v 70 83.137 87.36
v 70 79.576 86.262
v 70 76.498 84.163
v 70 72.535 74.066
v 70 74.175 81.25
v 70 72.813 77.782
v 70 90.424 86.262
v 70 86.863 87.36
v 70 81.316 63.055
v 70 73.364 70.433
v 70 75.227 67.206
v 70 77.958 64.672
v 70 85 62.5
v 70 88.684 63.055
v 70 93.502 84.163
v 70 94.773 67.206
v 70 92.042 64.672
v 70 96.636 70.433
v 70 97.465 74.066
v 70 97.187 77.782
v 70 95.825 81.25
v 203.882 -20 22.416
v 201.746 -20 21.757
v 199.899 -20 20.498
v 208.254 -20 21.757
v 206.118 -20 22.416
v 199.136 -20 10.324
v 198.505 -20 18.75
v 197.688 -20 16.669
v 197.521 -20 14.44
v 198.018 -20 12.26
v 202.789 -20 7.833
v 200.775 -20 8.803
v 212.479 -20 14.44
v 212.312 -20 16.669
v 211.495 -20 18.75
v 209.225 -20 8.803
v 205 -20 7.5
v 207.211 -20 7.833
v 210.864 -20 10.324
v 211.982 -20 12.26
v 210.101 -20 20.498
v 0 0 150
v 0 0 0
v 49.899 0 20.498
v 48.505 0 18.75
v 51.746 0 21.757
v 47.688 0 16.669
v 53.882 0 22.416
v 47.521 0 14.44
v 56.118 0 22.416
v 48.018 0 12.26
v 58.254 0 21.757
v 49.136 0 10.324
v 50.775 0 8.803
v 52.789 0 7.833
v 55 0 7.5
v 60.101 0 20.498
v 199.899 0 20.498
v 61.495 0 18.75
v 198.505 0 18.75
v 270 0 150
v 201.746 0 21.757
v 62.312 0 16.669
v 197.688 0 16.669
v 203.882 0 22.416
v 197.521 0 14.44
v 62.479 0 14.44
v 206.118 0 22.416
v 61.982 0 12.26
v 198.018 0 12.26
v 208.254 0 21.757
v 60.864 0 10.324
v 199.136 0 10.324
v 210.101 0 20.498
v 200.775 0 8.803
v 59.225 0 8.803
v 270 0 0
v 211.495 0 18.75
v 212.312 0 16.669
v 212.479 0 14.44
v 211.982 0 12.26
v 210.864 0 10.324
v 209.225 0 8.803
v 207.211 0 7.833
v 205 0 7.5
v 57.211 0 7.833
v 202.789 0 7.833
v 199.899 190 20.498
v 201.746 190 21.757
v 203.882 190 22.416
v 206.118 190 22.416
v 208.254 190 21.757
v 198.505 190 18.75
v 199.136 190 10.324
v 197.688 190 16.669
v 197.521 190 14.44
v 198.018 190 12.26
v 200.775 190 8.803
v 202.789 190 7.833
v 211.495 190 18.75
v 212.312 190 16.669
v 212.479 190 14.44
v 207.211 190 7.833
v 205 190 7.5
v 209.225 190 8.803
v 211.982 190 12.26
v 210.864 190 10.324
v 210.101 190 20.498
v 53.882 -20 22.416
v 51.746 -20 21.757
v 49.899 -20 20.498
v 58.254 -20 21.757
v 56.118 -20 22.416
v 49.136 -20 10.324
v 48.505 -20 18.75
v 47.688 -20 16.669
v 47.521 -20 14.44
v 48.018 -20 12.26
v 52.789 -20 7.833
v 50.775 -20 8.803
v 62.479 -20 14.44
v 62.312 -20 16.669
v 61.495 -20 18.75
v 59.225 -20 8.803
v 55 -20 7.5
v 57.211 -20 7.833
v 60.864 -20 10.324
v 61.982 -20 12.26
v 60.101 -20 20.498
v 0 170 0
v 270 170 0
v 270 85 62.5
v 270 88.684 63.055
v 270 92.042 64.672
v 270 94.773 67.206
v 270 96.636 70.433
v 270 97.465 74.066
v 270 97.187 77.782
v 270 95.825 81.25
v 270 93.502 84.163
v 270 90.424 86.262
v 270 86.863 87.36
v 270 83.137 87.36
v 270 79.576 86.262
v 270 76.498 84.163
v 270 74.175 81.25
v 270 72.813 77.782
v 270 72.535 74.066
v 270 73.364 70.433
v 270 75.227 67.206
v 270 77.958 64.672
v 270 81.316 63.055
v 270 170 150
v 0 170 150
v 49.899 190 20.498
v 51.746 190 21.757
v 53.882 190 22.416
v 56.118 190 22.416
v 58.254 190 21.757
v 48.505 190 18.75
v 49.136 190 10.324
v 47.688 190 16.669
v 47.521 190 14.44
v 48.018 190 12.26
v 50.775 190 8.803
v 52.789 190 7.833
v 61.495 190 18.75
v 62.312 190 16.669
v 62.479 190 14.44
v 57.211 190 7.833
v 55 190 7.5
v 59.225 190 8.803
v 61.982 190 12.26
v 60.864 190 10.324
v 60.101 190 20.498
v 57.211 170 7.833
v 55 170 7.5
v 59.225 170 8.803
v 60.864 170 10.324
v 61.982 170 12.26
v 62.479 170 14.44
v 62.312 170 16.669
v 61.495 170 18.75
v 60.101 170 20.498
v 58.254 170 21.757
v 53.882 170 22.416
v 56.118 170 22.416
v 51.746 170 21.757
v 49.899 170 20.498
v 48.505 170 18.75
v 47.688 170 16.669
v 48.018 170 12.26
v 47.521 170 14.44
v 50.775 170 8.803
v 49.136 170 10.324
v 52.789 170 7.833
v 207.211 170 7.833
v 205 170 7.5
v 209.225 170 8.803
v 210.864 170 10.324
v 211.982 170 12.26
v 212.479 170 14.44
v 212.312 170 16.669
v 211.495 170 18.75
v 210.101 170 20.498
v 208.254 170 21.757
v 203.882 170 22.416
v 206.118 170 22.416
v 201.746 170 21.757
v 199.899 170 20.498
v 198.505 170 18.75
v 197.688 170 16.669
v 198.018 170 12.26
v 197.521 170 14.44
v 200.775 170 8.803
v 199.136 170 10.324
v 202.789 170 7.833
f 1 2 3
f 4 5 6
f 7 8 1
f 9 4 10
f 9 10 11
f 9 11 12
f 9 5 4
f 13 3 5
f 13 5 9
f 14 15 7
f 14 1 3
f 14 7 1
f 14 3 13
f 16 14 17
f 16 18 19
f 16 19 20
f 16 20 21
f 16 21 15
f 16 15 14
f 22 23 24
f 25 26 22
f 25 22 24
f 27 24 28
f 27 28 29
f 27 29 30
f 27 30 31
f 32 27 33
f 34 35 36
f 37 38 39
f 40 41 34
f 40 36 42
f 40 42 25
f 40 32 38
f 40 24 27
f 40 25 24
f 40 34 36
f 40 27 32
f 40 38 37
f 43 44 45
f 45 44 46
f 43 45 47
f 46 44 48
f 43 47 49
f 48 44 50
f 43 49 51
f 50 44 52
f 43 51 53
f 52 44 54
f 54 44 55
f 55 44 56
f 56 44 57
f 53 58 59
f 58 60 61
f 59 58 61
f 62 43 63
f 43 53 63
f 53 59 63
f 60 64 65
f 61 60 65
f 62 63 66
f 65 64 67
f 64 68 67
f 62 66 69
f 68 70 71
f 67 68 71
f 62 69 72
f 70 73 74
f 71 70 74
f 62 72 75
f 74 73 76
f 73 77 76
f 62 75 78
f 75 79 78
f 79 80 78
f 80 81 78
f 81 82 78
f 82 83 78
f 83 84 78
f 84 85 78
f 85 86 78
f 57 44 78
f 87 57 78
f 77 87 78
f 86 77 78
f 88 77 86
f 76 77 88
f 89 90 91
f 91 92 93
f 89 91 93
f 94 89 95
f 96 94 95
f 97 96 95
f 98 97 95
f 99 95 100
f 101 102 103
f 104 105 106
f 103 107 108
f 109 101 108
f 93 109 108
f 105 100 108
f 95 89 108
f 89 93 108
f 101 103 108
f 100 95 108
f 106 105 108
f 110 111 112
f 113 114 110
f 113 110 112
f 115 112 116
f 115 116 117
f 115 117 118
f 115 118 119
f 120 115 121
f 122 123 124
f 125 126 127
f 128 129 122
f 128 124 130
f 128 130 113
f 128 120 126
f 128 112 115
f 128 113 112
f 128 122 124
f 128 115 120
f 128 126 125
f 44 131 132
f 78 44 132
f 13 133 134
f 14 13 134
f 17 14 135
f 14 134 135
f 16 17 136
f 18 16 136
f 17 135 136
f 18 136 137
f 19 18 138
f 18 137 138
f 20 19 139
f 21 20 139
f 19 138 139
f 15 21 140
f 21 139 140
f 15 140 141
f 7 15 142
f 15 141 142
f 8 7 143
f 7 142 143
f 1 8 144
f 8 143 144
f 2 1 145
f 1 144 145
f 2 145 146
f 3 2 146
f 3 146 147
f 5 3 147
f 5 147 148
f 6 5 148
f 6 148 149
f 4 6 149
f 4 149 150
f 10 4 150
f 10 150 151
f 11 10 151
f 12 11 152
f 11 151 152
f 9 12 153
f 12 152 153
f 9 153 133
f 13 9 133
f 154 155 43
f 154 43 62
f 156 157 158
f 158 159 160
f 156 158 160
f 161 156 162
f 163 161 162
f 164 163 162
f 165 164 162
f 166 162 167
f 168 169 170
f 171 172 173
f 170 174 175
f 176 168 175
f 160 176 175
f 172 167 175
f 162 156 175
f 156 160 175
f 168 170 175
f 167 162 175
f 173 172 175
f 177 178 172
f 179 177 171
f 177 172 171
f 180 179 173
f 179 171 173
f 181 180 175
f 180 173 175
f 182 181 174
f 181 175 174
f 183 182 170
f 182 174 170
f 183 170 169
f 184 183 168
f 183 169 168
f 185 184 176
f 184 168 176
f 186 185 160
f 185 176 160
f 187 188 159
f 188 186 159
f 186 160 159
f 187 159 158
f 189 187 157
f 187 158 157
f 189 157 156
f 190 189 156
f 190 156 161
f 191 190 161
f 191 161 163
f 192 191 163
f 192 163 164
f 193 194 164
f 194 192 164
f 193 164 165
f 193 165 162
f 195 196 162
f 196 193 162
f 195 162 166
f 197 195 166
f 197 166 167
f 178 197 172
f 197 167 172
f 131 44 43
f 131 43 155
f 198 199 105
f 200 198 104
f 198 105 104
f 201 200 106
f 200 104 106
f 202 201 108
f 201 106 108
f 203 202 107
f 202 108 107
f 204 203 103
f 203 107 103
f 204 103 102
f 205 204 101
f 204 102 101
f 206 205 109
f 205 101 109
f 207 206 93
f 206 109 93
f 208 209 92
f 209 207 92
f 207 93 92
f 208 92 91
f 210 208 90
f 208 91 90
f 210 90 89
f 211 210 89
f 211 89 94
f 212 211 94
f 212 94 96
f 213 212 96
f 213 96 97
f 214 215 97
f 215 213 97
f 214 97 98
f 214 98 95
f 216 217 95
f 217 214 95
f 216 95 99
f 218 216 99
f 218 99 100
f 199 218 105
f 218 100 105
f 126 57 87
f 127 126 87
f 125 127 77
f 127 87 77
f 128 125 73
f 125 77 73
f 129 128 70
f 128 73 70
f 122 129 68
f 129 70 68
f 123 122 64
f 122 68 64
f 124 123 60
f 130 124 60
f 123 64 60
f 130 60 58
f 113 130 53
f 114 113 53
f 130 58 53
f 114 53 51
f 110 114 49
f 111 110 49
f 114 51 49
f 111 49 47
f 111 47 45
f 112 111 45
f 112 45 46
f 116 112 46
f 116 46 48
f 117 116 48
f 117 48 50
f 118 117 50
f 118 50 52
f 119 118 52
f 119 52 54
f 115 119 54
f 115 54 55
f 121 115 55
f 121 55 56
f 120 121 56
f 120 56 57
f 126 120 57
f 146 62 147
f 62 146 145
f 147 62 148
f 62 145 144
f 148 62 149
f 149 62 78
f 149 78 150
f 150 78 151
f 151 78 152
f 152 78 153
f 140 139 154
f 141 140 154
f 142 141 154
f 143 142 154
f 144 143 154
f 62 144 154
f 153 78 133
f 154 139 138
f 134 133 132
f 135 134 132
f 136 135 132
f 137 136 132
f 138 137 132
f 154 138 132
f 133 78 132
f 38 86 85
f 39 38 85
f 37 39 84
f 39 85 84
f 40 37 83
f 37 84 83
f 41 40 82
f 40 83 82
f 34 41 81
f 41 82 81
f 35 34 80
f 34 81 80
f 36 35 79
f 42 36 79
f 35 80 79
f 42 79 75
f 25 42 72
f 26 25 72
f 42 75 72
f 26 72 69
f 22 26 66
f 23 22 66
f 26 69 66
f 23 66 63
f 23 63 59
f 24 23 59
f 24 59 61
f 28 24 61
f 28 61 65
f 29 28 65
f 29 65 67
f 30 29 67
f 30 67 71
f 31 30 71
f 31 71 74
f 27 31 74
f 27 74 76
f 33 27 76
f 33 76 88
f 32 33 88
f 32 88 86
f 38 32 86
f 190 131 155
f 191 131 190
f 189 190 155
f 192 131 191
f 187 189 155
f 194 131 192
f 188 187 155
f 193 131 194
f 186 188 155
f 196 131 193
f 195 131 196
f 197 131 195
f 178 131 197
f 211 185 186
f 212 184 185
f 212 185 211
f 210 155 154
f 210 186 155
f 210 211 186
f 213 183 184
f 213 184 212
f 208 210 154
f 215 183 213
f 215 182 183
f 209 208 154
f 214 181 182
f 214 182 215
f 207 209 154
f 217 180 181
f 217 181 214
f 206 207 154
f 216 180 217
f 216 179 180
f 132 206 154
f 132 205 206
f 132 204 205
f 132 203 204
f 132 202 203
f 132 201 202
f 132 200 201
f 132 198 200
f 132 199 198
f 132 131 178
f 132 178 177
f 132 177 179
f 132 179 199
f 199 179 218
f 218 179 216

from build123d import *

# Parameters (mm, degrees)
SKETCH1_W                = 270
SKETCH1_H                = 170
BOSS_EXTRUDE1_DEPTH      = 150
SKETCH2_R                = 12.5
CUT_EXTRUDE1_DEPTH       = 200
BOSS_EXTRUDE2_DEPTH      = 20
BOSS_EXTRUDE2_DEPTH_BACK = 190
SKETCH3_R                = 7.5


with BuildPart() as part:
    # Sketch1 → Boss-Extrude1 (new body)
    with BuildSketch(Plane.XY):
        with Locations((135, 85)):
            Rectangle(SKETCH1_W, SKETCH1_H)
    extrude(amount=BOSS_EXTRUDE1_DEPTH)

    # Sketch2 → Cut-Extrude1 (cut)
    with BuildSketch(Plane(origin=(270, 0, 0), x_dir=(0, 0, -1), z_dir=(1, 0, 0))):
        with Locations((-75, 85)):
            Circle(SKETCH2_R)
    extrude(amount=-CUT_EXTRUDE1_DEPTH, mode=Mode.SUBTRACT)

    # Sketch3 → Boss-Extrude2 (add, two sides: drawn at the far end of the back side and taken through both)
    with BuildSketch(Plane.XZ.offset(-BOSS_EXTRUDE2_DEPTH_BACK)):
        with Locations(Location((55, 15, 0), (0, 0, 270))):
            Circle(SKETCH3_R)
        with Locations(Location((205, 15, 0), (0, 0, 270))):
            Circle(SKETCH3_R)
    extrude(amount=BOSS_EXTRUDE2_DEPTH + BOSS_EXTRUDE2_DEPTH_BACK)


solid = part.part
